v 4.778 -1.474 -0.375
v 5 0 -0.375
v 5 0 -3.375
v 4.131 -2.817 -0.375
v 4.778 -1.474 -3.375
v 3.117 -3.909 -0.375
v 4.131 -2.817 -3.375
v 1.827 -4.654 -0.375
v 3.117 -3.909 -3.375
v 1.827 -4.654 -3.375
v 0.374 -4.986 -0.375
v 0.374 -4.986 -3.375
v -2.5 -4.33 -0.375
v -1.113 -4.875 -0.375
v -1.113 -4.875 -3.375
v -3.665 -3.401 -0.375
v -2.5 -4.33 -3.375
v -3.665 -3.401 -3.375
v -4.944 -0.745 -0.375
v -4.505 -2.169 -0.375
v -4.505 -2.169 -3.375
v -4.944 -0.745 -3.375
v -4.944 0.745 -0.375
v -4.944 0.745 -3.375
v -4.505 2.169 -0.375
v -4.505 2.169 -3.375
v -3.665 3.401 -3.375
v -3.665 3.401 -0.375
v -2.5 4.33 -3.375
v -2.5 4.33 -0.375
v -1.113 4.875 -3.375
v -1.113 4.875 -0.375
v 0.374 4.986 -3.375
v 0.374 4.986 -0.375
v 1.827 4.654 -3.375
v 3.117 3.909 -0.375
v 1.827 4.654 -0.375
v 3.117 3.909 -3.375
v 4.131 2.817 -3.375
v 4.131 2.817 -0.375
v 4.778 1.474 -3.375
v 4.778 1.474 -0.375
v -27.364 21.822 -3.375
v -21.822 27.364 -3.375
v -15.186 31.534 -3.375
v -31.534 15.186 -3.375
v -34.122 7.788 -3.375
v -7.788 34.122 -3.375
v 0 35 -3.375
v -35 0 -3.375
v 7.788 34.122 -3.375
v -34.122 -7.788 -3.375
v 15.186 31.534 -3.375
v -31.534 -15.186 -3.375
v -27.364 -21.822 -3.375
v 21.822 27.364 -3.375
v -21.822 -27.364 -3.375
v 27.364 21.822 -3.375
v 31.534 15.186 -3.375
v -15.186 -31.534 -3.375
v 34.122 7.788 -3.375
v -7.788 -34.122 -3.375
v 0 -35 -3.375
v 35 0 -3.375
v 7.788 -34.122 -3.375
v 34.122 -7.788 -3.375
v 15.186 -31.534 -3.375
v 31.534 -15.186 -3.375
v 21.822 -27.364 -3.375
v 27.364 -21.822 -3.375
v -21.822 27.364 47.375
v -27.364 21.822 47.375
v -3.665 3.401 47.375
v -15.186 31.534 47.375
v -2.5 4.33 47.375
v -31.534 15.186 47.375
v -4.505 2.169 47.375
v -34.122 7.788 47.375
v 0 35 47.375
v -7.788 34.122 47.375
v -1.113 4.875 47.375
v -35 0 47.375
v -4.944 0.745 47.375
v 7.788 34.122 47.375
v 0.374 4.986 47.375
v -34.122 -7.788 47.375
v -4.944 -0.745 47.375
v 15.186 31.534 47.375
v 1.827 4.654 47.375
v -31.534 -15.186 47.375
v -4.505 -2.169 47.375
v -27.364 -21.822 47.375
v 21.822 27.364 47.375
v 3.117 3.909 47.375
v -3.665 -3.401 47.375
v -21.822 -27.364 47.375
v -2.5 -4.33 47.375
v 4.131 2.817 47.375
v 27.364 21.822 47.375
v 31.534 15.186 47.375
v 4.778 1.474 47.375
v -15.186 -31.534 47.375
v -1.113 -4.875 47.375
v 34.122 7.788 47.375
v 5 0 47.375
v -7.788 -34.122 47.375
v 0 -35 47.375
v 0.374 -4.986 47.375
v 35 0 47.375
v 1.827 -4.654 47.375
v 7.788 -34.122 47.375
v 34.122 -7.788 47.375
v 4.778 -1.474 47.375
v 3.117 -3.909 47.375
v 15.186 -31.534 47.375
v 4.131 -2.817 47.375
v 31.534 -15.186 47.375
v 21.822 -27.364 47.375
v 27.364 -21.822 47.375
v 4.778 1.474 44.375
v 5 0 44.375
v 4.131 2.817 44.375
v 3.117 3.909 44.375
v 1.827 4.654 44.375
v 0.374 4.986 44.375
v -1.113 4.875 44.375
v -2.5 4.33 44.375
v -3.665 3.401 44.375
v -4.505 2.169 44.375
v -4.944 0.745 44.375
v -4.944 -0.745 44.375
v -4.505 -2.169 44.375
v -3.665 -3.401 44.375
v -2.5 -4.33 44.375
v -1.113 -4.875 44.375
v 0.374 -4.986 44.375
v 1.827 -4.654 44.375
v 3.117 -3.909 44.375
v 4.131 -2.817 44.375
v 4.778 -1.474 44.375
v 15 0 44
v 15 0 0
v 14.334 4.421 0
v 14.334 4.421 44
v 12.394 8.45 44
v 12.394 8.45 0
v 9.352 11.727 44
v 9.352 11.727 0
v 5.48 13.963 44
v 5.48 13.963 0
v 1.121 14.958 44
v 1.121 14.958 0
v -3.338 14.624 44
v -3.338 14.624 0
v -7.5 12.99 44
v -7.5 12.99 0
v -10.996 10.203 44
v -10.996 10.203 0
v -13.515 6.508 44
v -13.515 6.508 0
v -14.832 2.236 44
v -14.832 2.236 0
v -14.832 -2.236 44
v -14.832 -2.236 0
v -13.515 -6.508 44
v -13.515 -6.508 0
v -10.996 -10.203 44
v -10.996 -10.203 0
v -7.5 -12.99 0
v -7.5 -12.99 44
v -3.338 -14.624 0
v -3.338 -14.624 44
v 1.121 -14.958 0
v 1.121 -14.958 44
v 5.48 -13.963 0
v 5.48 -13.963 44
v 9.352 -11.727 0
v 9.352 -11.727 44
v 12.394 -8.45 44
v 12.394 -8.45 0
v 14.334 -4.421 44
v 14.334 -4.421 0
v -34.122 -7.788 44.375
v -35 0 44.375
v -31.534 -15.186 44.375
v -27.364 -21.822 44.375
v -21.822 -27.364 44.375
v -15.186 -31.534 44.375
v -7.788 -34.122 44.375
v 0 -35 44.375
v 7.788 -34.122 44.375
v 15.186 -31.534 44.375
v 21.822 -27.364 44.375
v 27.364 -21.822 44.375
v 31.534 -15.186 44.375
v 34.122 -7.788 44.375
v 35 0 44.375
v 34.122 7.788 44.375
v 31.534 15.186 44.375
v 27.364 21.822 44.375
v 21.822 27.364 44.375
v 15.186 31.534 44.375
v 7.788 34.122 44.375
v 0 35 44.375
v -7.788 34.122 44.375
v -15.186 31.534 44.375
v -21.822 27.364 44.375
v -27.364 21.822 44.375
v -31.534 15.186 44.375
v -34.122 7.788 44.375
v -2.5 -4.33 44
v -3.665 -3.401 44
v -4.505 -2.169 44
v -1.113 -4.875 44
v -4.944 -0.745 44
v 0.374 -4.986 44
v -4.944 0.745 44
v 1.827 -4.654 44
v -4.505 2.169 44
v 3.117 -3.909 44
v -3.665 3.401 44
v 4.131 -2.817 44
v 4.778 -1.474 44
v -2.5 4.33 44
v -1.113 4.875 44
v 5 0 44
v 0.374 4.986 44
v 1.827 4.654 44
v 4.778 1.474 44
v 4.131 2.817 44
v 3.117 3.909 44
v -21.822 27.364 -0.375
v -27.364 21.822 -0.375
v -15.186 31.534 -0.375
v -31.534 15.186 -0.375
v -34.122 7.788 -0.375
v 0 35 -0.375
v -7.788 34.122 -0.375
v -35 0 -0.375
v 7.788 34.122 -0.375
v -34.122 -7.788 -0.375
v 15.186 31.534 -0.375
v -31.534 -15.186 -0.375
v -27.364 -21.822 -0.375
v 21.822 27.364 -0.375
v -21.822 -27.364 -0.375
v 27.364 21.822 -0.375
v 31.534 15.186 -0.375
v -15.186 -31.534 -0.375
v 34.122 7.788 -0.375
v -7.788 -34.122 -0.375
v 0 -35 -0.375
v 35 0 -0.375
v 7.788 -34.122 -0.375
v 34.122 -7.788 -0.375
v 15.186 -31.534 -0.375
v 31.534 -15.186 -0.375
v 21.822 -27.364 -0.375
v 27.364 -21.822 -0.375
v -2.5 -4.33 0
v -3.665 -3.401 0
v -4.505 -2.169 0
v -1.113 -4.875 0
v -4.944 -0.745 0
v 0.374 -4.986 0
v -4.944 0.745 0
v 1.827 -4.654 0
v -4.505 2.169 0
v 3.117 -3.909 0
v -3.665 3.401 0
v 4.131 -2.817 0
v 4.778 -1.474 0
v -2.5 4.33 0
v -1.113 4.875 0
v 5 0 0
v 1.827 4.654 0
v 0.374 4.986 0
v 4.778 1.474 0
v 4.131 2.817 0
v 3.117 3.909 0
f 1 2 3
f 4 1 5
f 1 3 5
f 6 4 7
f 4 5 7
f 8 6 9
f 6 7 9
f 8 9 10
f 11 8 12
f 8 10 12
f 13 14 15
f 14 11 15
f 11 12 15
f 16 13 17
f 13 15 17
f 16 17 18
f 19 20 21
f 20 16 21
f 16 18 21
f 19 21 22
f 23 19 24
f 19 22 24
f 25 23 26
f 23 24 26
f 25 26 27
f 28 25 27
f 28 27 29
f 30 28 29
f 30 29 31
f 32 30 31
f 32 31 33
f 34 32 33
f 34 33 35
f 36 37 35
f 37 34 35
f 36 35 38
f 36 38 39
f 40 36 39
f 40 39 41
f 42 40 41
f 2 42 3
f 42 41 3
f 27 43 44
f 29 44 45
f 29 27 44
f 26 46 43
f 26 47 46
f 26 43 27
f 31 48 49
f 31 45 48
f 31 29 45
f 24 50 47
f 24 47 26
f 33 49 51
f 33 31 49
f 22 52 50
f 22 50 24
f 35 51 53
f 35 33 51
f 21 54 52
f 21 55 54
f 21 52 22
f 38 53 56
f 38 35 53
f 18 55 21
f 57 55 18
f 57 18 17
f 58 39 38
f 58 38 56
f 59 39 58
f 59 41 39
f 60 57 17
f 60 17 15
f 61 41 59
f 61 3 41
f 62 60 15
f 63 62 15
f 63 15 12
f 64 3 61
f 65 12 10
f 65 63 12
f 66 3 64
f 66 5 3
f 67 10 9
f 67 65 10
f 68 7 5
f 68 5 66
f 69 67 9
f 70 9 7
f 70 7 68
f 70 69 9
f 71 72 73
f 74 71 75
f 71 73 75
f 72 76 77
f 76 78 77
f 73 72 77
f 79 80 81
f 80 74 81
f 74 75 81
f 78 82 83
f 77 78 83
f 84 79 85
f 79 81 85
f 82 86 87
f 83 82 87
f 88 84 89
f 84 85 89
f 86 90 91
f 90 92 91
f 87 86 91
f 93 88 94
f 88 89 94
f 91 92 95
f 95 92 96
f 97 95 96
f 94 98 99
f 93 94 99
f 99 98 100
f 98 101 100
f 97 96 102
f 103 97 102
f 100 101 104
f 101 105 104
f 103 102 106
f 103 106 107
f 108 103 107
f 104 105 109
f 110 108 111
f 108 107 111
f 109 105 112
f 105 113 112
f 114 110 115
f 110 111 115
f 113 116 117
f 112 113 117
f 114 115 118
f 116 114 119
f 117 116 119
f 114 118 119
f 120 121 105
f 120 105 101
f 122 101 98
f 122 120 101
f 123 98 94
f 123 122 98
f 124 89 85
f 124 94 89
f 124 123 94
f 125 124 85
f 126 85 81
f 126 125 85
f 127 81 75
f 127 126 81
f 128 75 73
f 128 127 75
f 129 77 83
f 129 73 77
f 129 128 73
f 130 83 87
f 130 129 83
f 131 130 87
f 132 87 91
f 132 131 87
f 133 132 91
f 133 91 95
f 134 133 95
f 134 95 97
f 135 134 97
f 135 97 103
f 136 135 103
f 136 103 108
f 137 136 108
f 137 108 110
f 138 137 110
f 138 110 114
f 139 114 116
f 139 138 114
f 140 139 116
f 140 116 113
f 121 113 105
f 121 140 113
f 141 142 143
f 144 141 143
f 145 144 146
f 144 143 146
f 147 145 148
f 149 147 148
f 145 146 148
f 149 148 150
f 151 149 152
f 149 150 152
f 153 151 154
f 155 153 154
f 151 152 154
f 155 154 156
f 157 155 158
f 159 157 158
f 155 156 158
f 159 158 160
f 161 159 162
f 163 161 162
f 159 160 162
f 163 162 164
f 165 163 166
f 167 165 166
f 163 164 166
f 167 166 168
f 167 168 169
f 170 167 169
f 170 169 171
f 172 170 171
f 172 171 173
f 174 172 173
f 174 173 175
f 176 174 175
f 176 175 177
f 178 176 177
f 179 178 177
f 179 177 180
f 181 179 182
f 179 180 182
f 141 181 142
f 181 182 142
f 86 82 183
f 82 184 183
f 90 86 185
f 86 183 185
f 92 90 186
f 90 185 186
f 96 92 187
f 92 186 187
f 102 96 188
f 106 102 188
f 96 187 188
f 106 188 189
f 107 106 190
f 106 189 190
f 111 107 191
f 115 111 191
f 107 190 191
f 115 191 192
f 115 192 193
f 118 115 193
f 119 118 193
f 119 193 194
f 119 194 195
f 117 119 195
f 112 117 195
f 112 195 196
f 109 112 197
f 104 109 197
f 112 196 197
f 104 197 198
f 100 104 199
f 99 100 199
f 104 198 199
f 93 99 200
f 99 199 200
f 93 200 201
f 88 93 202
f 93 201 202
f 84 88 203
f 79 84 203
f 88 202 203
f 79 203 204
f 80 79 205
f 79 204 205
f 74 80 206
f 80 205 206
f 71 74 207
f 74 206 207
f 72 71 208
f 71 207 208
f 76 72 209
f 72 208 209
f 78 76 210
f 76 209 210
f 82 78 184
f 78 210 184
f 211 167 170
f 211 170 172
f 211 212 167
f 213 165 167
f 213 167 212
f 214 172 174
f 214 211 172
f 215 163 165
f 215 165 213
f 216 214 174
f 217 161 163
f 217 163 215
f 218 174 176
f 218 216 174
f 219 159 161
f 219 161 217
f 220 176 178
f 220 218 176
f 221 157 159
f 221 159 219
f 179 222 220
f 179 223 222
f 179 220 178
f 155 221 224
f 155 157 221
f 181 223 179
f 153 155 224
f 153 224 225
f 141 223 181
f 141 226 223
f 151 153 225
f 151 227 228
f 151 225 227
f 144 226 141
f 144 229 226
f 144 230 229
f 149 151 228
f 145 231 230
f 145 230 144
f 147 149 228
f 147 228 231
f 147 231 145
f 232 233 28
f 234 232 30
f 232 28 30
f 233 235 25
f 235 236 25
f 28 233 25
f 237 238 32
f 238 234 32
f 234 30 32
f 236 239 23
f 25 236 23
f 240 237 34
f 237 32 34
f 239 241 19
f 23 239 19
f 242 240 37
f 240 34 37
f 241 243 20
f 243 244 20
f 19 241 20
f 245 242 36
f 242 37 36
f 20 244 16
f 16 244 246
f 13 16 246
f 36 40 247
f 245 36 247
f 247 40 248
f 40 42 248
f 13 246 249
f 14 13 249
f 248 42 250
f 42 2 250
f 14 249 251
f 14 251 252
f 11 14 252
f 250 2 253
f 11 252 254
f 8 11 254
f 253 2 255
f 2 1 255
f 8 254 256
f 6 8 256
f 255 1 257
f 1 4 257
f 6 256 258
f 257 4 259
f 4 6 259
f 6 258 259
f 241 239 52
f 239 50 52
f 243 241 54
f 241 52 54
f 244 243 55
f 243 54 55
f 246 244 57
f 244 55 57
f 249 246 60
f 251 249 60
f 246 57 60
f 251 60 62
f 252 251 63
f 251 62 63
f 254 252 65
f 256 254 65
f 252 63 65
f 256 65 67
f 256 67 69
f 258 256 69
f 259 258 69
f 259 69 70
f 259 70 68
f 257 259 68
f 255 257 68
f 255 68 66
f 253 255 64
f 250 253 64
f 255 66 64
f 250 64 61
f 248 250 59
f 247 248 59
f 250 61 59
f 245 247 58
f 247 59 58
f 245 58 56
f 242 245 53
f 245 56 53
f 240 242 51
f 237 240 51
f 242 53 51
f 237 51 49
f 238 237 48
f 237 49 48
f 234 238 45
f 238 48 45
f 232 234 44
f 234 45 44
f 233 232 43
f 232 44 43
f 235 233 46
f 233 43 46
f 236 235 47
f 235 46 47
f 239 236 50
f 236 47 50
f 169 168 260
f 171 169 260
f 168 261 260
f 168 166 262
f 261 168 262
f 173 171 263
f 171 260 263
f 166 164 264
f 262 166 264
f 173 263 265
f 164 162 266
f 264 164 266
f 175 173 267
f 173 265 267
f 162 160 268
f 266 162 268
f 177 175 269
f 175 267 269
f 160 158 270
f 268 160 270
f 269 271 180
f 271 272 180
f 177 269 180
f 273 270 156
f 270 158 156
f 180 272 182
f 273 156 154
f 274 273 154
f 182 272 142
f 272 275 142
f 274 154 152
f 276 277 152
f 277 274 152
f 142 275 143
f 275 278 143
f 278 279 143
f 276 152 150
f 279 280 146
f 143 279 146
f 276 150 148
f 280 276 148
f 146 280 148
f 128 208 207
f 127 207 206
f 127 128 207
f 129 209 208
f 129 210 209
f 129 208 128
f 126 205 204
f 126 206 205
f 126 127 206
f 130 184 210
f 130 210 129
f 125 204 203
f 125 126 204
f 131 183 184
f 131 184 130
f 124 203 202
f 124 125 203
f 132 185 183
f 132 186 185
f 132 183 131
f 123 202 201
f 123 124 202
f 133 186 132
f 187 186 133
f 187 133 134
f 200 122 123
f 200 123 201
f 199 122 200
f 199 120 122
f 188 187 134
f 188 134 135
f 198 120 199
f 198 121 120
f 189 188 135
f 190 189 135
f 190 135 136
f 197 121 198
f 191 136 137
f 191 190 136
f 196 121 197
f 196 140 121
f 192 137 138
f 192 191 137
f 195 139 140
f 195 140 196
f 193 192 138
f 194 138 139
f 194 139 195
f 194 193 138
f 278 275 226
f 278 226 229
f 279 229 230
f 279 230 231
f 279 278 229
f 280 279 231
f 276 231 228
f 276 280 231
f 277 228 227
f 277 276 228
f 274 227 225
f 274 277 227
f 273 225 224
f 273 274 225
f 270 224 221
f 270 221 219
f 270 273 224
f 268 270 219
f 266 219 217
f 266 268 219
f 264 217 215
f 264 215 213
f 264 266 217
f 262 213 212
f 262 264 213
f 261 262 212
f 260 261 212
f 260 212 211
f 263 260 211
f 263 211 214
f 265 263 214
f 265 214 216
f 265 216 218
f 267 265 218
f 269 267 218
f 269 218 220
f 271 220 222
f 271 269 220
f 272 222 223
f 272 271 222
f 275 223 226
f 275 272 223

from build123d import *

# Parameters (mm, degrees)
ESQUISSE1_R                  = 15
ESQUISSE1_R_2                = 5
BOSS_EXTRU_1_DEPTH           = 44
ESQUISSE2_W                  = 3
ESQUISSE2_H                  = 35
ENL_V_MAT_EXTRU_2_DEPTH      = 64
ENL_V_MAT_EXTRU_2_DEPTH_BACK = 0.374681
ESQUISSE3_R                  = 5
ESQUISSE5_R                  = 5
ENL_V_MAT_EXTRU_3_DEPTH      = 71.890745446


with BuildPart() as part:
    # Esquisse1 → Boss.-Extru.1 (new body)
    with BuildSketch(Plane.XY):
        Circle(ESQUISSE1_R)
        Circle(ESQUISSE1_R_2, mode=Mode.SUBTRACT)
    extrude(amount=BOSS_EXTRU_1_DEPTH)


with BuildPart() as body_2:
    # Esquisse2 → Révolution3 (revolve)
    with BuildSketch(Plane(origin=(0, 0, 0), x_dir=(0, 0, -1), z_dir=(1, 0, 0)), mode=Mode.PRIVATE) as r_volution3_sk:
        with Locations((1.874681229, 17.5)):
            Rectangle(ESQUISSE2_W, ESQUISSE2_H)
        with Locations((-45.874681229, 17.5)):
            Rectangle(ESQUISSE2_W, ESQUISSE2_H)
    revolve(r_volution3_sk.sketch.rotate(Axis((0, 0, 44.374681229), (0, 0, 1)), 90), axis=Axis((0, 0, 44.374681229), (0, 0, 1)))

    # Esquisse3 → Enlèv. mat.-Extru.2 (cut, two sides: drawn at the far end of the back side and taken through both)
    with BuildSketch(Plane.XY.offset(-ENL_V_MAT_EXTRU_2_DEPTH_BACK)):
        Circle(ESQUISSE3_R)
    extrude(amount=ENL_V_MAT_EXTRU_2_DEPTH + ENL_V_MAT_EXTRU_2_DEPTH_BACK, mode=Mode.SUBTRACT)

    # Esquisse5 → Enlèv. mat.-Extru.3 (cut, through all)
    with BuildSketch(Plane(origin=(0, 0, -3.374681229), x_dir=(-1, 0, 0), z_dir=(0, 0, -1))):
        with Locations(Location((0, 0, 0), (0, 0, 180))):
            Circle(ESQUISSE5_R)
    extrude(amount=-ENL_V_MAT_EXTRU_3_DEPTH, mode=Mode.SUBTRACT)


solid = Compound([part.part, body_2.part])
